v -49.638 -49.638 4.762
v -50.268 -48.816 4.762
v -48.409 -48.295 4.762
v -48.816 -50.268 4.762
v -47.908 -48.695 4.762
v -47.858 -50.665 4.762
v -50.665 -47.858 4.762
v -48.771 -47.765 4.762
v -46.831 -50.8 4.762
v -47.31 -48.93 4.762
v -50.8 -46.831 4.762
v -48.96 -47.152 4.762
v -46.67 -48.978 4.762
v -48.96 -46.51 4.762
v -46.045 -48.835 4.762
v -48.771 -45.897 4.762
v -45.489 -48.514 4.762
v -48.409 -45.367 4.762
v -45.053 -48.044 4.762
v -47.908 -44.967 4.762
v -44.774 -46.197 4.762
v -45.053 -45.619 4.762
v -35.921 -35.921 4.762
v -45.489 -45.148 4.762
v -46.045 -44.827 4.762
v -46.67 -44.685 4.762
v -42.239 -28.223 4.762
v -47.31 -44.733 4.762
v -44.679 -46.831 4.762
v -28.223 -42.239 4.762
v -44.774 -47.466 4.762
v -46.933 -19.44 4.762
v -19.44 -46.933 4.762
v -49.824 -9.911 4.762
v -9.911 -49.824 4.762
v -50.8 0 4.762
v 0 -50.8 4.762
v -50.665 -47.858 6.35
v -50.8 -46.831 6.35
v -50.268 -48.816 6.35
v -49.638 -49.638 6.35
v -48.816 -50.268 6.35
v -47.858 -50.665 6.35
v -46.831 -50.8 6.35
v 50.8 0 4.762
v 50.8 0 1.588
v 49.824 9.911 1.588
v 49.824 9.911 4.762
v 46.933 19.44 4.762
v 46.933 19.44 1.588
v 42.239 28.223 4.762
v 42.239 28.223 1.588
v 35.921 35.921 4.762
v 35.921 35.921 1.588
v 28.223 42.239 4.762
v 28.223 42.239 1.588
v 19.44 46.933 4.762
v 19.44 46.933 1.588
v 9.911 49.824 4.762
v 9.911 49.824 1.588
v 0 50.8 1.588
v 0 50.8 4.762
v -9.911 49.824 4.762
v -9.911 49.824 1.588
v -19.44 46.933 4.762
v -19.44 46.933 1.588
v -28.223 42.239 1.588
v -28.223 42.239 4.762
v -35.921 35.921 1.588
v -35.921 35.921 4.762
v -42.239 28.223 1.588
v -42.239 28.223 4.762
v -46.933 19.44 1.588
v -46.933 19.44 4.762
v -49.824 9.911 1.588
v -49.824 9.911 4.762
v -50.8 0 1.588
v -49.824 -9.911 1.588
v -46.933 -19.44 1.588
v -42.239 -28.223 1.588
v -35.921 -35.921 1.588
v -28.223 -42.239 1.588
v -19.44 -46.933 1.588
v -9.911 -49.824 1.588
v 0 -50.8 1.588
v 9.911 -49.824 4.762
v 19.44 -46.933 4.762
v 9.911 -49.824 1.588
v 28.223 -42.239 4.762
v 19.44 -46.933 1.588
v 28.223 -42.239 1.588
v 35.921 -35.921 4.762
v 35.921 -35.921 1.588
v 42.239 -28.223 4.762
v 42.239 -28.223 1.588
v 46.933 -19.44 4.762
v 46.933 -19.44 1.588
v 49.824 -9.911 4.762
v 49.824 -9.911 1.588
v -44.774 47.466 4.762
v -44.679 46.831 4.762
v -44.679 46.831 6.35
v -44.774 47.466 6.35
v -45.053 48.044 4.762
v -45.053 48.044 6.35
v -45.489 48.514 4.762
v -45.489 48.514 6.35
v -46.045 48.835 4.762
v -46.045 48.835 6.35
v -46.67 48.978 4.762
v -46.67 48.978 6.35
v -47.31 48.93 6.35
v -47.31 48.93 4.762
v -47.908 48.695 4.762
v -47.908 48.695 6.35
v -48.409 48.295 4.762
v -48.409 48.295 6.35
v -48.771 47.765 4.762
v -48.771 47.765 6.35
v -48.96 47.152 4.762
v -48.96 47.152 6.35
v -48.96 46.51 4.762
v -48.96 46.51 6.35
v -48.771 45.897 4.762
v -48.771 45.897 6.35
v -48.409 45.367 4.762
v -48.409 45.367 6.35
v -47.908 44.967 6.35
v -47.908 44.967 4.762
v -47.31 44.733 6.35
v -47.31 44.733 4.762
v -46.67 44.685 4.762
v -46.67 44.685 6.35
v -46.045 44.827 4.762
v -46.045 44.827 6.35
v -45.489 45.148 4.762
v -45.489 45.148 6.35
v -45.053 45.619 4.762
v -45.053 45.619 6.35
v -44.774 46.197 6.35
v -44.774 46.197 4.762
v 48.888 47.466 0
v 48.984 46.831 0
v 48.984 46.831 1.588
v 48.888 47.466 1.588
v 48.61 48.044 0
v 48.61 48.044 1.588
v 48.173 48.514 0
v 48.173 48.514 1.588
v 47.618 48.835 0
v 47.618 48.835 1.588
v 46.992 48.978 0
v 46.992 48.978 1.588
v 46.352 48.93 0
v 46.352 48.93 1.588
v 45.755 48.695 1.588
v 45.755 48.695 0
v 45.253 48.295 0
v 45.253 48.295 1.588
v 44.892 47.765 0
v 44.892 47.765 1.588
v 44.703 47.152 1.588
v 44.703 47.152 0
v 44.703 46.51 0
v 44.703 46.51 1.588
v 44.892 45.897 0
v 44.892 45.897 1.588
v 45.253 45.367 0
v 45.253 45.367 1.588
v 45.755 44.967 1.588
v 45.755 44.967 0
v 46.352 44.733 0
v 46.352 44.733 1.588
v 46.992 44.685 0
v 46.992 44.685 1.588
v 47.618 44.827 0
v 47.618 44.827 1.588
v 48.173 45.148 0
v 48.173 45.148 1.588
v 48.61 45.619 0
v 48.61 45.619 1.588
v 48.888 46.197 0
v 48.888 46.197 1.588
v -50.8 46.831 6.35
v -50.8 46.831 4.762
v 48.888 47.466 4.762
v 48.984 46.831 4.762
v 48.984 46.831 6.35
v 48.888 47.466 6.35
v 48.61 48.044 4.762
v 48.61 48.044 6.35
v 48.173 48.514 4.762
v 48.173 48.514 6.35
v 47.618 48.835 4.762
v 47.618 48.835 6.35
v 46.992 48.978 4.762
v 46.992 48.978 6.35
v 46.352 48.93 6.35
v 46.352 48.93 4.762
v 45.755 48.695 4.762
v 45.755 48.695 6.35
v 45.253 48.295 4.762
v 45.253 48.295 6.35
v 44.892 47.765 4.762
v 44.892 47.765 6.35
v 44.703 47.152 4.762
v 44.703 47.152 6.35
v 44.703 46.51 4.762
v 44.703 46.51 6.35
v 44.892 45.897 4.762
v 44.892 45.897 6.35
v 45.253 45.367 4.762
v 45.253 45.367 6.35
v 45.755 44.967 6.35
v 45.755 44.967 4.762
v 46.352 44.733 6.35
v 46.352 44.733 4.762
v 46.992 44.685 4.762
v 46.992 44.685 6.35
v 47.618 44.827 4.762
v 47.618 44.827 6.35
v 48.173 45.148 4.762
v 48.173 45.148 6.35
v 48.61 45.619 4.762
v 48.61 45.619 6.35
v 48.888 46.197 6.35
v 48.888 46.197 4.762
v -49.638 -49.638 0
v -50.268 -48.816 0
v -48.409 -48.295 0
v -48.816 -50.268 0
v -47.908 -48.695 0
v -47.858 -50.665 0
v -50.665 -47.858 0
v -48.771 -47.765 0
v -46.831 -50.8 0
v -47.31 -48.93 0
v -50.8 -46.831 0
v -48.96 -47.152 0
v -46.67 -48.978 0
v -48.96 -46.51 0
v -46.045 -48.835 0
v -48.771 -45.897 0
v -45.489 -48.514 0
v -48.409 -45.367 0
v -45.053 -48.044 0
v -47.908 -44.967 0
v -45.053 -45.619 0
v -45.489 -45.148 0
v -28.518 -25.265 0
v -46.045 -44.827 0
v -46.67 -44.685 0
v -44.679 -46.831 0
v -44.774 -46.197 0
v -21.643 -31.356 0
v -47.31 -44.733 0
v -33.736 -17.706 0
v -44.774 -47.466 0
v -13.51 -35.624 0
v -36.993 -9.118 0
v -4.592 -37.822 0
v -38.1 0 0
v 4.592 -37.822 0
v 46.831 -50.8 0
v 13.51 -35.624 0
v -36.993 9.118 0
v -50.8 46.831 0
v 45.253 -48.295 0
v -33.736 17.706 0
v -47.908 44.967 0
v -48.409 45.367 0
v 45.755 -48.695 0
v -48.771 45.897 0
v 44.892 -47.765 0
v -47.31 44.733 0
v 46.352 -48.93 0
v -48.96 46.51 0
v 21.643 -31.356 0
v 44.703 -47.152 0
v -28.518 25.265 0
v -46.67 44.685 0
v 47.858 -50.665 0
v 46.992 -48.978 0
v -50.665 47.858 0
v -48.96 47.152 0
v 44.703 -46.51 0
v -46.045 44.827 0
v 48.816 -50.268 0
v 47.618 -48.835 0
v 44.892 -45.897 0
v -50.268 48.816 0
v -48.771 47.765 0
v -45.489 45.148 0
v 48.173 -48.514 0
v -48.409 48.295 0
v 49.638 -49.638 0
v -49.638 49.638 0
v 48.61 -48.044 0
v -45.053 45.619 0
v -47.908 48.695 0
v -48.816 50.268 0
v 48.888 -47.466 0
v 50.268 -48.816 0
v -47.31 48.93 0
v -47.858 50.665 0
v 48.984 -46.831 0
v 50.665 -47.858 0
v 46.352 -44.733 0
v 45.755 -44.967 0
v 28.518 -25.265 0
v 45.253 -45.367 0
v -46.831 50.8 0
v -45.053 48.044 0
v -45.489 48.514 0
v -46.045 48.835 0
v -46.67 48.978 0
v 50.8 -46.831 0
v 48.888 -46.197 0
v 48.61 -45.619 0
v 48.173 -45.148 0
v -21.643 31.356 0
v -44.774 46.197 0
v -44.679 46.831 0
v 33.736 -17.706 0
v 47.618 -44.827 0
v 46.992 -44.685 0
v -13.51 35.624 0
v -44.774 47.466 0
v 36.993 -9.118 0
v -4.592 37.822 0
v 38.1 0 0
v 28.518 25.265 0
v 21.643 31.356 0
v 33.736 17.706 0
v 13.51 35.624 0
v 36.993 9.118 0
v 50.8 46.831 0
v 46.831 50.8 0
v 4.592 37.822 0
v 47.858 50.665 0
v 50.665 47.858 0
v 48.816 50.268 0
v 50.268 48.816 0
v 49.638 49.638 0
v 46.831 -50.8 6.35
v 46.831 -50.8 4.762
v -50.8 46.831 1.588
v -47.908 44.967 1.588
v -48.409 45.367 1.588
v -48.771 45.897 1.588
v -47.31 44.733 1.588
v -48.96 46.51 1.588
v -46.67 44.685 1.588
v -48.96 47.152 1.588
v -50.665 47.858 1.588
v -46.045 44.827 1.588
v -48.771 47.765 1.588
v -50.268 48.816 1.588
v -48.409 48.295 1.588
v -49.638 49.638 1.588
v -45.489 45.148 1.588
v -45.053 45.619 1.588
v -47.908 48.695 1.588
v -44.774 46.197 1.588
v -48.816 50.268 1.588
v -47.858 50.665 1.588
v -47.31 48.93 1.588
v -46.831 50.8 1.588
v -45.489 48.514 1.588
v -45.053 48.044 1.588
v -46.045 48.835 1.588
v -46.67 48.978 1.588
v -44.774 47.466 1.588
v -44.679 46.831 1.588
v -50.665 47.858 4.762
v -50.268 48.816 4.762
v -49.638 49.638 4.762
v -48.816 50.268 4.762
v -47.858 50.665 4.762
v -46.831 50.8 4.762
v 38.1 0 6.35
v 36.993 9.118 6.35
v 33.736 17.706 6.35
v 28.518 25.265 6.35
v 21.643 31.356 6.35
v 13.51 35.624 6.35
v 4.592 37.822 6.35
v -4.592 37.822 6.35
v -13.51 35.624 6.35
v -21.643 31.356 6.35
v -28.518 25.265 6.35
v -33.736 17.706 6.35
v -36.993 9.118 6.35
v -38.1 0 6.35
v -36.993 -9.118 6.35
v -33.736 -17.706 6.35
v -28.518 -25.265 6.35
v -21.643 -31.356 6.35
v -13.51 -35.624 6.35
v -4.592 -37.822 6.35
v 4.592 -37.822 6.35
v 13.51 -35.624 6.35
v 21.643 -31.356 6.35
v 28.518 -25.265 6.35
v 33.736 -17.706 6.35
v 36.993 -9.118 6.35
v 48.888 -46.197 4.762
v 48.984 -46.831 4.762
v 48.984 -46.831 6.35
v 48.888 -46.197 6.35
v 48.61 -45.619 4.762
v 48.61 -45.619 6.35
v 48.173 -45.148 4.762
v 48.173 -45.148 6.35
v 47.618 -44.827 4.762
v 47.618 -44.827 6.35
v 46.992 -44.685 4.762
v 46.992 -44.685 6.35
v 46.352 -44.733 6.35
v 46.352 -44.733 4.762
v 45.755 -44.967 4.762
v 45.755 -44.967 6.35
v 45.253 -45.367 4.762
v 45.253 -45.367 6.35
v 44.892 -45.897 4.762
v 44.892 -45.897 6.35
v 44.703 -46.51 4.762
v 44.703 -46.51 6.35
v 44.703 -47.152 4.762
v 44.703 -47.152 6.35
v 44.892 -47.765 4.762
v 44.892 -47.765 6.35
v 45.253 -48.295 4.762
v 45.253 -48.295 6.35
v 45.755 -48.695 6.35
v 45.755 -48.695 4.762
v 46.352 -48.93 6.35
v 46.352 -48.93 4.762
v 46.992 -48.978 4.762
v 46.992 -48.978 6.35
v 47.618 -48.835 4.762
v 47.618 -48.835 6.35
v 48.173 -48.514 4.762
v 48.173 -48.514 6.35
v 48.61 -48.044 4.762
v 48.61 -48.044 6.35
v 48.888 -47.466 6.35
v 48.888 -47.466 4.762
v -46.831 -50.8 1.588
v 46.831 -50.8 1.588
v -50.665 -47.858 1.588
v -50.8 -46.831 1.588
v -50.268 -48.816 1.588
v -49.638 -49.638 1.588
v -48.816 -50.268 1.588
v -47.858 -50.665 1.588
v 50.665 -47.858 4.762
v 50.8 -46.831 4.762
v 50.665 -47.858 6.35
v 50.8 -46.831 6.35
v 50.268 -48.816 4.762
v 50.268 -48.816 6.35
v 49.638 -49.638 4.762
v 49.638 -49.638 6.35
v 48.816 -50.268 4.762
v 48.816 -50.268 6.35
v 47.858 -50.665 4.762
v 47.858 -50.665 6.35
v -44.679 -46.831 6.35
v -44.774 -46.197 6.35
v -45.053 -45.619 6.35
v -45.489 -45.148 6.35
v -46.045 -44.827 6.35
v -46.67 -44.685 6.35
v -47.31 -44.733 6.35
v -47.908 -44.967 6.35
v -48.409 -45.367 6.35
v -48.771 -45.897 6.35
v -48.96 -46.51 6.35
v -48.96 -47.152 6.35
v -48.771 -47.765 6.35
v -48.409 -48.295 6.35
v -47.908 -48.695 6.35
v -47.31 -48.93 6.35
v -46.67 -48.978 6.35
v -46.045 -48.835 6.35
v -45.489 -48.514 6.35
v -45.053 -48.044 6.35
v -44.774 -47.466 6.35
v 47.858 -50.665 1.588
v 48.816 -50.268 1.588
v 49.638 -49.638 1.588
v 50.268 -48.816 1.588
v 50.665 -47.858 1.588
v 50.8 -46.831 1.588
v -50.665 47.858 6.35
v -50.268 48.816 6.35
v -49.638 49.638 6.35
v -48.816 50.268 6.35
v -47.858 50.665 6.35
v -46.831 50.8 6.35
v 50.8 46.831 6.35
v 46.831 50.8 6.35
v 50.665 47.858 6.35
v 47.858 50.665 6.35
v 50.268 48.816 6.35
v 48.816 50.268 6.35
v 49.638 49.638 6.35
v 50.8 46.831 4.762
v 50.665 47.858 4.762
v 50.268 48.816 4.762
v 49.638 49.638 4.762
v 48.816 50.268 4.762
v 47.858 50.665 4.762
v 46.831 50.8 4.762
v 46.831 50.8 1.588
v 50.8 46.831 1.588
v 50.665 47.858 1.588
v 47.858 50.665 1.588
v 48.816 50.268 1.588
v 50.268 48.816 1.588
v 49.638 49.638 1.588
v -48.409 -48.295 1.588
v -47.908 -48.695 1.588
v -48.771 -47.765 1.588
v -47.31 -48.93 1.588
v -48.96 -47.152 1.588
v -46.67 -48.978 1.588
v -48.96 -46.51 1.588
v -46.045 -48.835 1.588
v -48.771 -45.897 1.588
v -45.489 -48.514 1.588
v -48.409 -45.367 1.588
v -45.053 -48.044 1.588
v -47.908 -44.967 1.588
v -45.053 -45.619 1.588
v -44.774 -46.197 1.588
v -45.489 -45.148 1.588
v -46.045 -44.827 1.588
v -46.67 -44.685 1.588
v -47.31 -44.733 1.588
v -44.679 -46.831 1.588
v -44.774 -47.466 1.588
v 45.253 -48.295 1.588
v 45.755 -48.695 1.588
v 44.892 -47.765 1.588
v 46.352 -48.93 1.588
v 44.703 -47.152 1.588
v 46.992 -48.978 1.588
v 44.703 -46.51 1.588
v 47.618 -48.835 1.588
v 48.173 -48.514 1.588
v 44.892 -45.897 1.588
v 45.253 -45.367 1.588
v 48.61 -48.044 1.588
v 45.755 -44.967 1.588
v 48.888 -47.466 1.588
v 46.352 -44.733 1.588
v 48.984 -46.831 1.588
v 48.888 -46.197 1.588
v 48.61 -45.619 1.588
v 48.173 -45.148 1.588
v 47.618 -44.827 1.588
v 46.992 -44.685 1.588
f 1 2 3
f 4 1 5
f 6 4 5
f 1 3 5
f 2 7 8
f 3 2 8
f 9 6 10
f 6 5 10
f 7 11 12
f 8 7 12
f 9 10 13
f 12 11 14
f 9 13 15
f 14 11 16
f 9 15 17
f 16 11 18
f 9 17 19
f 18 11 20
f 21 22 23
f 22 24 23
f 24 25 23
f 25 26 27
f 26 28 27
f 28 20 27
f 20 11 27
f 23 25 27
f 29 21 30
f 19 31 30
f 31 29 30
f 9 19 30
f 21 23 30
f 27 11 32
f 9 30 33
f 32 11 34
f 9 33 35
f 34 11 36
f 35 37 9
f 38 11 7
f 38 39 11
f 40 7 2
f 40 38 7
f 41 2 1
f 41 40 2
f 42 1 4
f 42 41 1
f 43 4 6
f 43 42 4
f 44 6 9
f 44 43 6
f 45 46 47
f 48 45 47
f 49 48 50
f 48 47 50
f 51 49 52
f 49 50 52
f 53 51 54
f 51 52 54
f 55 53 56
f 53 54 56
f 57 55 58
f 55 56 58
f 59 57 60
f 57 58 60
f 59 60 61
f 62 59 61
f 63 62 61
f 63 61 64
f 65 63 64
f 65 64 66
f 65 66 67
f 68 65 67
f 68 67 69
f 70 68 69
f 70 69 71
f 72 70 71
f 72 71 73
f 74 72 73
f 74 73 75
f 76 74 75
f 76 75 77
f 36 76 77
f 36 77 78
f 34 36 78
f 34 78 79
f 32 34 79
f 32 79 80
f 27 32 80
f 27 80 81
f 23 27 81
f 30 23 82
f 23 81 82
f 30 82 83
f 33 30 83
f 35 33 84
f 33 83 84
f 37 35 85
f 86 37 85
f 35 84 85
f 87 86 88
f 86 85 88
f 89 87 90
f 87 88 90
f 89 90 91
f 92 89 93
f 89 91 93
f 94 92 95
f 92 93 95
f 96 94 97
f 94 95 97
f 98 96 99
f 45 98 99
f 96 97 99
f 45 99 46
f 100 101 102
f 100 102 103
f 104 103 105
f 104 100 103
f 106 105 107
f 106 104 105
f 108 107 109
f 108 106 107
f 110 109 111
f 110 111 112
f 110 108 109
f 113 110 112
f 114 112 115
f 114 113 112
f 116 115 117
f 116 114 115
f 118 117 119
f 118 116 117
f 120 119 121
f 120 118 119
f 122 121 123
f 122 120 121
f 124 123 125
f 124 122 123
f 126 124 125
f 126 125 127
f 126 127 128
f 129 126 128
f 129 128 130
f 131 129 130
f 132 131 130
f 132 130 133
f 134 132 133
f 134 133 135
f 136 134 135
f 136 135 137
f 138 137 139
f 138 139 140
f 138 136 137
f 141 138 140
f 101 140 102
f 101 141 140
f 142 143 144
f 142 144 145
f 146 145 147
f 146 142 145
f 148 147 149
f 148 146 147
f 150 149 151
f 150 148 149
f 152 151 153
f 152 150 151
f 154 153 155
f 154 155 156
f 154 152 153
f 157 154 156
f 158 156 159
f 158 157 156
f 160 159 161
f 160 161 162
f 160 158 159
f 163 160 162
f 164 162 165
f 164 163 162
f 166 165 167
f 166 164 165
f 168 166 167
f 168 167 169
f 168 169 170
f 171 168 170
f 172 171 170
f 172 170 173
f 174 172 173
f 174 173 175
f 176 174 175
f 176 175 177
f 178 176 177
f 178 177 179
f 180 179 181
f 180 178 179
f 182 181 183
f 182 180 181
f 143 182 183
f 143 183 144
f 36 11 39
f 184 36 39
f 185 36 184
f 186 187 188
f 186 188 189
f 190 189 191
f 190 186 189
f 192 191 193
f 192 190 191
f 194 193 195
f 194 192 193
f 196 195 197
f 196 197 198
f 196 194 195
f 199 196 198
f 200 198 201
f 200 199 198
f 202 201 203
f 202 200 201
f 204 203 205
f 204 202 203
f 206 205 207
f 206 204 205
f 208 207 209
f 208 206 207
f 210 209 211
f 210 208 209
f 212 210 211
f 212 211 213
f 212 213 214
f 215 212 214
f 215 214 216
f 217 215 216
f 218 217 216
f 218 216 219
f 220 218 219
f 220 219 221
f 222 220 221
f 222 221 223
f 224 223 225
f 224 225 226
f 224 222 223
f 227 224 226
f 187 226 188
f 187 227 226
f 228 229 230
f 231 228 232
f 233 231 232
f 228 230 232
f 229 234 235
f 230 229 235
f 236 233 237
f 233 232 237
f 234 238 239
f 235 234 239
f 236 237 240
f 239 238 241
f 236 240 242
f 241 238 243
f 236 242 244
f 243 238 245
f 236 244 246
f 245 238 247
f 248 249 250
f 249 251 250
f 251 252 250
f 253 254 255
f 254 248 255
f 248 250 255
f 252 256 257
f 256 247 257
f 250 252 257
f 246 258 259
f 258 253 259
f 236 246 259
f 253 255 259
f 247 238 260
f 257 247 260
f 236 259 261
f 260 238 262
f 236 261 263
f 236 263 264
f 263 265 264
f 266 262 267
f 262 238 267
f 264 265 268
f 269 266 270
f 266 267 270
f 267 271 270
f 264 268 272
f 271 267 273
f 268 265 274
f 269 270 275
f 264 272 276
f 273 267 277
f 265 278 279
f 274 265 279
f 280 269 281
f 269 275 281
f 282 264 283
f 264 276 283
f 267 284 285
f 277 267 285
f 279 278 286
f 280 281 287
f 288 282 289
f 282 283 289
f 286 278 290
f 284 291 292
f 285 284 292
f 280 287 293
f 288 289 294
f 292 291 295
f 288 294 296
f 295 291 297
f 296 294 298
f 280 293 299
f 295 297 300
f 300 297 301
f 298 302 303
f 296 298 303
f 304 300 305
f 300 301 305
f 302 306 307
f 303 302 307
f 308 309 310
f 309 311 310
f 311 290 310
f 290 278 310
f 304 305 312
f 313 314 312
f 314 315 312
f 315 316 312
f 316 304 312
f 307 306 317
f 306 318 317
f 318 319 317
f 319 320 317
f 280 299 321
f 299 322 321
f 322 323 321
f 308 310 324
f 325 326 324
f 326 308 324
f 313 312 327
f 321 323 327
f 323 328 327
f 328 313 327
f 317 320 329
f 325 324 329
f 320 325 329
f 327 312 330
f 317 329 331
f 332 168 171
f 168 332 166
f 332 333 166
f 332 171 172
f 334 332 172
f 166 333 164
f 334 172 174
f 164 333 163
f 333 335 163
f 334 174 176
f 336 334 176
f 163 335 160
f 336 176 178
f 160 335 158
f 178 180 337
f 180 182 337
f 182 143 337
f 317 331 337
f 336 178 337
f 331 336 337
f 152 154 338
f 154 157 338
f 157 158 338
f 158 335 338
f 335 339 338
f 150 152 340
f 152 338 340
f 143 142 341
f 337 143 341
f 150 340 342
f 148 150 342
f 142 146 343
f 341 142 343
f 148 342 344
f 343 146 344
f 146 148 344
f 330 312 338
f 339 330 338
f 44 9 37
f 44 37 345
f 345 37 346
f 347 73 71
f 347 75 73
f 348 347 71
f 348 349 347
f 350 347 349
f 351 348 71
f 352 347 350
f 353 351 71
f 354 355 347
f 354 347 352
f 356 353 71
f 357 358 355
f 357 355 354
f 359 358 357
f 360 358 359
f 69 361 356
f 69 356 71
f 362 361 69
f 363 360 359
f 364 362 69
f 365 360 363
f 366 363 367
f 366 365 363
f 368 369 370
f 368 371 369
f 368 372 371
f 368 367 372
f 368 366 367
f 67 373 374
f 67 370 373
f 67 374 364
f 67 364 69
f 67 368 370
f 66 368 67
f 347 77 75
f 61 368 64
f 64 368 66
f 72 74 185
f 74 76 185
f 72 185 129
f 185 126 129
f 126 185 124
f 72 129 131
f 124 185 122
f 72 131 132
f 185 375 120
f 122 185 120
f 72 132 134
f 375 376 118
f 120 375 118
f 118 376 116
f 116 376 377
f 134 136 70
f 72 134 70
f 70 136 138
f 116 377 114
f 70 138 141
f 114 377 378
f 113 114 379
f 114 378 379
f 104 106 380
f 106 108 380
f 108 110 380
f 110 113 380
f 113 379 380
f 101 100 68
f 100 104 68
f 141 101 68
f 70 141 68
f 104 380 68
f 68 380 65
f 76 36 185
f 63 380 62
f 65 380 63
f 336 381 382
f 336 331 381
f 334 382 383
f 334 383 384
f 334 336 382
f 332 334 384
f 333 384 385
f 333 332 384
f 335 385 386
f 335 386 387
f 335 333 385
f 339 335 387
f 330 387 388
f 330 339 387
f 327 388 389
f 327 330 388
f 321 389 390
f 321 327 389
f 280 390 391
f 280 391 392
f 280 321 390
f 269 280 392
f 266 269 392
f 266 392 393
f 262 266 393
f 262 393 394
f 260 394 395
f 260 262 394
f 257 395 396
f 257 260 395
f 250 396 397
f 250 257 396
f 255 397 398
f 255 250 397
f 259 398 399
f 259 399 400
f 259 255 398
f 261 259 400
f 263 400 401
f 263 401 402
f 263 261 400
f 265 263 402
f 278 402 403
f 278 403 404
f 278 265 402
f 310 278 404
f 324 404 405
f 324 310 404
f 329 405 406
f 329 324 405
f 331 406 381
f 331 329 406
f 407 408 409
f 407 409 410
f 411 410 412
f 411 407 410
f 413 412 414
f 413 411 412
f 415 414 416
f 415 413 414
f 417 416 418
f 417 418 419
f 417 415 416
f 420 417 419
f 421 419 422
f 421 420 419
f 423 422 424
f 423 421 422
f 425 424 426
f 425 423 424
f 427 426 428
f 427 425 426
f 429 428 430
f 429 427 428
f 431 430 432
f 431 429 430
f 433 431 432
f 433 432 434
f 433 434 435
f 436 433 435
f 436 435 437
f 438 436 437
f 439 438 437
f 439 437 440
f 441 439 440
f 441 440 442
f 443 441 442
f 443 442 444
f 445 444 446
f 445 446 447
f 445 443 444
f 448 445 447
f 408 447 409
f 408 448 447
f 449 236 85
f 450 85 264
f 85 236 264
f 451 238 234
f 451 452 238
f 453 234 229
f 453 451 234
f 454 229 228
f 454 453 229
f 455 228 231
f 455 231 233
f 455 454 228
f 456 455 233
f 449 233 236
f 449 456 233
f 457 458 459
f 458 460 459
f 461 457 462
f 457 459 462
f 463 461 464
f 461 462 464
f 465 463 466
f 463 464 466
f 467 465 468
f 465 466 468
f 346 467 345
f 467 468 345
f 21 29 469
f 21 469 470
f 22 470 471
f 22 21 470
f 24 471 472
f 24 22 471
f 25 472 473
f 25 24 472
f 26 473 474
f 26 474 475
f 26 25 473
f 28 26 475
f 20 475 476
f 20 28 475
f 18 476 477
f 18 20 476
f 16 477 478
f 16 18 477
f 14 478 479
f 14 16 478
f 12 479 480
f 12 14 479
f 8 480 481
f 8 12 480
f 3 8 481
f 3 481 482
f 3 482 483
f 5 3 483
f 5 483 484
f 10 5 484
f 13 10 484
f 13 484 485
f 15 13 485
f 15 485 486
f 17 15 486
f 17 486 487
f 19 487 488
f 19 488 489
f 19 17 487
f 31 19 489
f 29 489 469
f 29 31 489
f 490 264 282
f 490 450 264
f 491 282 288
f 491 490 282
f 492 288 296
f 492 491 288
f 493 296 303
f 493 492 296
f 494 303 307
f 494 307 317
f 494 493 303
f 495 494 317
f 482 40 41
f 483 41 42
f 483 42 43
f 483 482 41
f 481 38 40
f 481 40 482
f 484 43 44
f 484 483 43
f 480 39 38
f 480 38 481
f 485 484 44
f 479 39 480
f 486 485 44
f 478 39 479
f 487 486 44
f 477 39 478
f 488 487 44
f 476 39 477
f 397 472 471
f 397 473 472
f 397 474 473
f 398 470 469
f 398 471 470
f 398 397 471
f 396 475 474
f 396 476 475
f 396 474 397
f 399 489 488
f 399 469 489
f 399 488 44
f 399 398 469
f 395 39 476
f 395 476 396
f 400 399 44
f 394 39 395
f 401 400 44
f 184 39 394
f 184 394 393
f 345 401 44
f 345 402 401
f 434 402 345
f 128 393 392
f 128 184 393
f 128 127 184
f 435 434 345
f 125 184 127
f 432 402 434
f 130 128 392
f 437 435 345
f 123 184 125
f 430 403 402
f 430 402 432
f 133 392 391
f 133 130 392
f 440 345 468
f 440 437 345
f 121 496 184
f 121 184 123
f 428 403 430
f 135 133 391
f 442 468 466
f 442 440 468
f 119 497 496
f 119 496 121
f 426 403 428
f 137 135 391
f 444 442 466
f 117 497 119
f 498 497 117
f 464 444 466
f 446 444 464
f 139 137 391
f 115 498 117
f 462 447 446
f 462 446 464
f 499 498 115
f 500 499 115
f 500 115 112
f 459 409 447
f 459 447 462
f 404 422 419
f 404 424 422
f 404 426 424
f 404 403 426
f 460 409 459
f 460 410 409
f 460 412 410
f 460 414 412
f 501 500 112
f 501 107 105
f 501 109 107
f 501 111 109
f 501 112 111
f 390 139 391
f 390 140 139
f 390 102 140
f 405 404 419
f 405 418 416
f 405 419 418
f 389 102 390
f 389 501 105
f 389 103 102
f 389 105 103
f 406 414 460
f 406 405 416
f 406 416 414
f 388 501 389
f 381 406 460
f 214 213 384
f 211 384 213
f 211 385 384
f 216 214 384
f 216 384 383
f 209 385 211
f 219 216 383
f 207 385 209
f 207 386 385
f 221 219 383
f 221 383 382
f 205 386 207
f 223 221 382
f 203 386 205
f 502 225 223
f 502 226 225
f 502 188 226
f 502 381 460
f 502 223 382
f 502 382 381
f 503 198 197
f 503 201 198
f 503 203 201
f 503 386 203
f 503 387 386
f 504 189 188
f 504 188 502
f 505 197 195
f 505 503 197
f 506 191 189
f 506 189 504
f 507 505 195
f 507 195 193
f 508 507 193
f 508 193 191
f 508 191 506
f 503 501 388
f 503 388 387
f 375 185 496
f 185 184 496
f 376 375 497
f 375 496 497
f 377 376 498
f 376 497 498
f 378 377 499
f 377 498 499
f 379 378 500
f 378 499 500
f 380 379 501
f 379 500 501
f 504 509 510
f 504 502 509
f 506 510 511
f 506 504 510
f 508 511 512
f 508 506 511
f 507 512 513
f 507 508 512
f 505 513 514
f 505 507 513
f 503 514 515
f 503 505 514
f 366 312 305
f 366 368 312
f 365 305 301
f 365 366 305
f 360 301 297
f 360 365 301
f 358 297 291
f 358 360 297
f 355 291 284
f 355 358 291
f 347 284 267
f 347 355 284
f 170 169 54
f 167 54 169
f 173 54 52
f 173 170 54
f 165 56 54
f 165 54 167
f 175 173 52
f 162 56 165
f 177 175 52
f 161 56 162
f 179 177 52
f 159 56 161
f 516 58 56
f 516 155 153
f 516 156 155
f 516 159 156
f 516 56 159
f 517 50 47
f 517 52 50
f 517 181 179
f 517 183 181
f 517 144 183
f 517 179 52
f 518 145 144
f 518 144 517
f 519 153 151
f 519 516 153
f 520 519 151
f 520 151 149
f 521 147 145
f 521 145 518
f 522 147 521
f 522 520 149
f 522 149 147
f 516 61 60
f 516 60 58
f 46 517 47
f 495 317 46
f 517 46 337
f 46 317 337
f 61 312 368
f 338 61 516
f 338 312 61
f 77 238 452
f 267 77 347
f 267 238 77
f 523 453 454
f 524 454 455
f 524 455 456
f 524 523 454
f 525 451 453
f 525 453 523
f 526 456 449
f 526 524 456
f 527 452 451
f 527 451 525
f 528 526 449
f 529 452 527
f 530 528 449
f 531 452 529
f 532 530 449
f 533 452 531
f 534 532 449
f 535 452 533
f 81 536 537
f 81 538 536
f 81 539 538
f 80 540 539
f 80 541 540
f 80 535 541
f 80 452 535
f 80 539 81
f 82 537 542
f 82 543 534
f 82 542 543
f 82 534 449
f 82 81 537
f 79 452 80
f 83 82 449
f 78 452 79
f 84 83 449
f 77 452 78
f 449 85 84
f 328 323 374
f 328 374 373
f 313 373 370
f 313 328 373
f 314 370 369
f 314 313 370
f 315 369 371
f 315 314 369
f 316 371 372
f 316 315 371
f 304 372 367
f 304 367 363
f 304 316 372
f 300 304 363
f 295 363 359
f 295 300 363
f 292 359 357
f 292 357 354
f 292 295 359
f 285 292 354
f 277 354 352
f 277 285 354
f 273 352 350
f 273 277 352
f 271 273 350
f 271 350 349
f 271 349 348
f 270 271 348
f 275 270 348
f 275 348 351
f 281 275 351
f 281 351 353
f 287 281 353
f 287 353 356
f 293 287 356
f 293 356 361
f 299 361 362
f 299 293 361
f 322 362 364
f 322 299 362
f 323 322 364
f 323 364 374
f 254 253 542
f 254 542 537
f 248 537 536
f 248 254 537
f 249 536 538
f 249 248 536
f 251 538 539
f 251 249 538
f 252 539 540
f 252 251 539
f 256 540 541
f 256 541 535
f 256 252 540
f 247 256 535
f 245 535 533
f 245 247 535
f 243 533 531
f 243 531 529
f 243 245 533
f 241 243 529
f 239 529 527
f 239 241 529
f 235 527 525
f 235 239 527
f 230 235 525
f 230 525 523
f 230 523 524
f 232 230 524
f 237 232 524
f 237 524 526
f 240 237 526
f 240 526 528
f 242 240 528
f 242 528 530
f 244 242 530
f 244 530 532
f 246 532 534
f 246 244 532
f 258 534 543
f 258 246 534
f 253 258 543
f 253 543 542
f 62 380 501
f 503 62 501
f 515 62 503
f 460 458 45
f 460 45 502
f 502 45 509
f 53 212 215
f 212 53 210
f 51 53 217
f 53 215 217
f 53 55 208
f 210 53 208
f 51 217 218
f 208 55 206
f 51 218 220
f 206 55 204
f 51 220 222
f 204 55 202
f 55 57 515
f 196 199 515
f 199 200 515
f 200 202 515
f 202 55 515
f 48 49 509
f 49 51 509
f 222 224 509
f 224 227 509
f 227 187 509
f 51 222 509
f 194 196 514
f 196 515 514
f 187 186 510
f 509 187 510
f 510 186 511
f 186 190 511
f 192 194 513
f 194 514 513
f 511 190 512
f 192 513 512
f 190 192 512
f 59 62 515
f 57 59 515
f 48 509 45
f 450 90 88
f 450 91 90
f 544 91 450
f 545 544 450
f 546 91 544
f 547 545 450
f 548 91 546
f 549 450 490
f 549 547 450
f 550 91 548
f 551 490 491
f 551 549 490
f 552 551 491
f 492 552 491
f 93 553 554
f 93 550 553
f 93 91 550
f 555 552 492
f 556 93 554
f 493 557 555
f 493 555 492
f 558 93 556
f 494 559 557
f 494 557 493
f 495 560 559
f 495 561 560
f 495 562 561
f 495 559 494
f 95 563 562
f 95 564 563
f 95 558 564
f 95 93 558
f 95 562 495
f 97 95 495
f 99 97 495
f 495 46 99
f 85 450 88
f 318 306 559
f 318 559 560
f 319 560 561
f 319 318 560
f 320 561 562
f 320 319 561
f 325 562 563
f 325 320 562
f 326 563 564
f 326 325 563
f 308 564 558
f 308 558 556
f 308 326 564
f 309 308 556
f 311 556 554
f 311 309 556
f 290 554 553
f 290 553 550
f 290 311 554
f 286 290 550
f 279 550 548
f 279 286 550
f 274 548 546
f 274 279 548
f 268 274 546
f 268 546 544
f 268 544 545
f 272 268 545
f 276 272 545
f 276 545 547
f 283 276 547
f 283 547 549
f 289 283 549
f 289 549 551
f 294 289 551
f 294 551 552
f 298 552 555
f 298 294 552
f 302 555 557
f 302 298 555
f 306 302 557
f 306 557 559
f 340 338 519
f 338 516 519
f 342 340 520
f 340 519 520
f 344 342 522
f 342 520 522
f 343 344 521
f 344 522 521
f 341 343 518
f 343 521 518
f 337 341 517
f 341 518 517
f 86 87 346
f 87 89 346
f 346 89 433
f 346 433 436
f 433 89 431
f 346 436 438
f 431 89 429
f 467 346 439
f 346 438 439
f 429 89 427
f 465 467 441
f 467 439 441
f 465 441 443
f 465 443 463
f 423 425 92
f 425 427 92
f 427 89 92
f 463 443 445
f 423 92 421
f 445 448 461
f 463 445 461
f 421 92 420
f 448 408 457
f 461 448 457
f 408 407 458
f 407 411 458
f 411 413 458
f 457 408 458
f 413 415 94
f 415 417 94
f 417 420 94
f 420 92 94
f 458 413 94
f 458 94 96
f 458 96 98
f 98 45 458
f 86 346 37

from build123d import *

# Parameters (mm, degrees)
F0_W     = 101.6
F0_H     = 101.6
F0_R     = 2.15265
F0_R_2   = 38.1
F1_DEPTH = 1.5875
F2_R     = 50.8
F2_R_2   = 38.1
F3_DEPTH = 3.175
F4_W     = 101.6
F4_H     = 101.6
F4_R     = 2.15265
F4_R_2   = 38.1
F5_DEPTH = 1.5875
F6_R     = 3.96875


with BuildPart() as f1:
    # F0 (on Top) → F1 (new body)
    with BuildSketch(Plane.XY):
        Rectangle(F0_W, F0_H)
        with Locations((-46.83125, -46.83125)):
            Circle(F0_R, mode=Mode.SUBTRACT)
        Circle(F0_R_2, mode=Mode.SUBTRACT)
        with Locations((46.83125, -46.83125)):
            Circle(F0_R, mode=Mode.SUBTRACT)
        with Locations((-46.83125, 46.83125)):
            Circle(F0_R, mode=Mode.SUBTRACT)
        with Locations((46.83125, 46.83125)):
            Circle(F0_R, mode=Mode.SUBTRACT)
    extrude(amount=F1_DEPTH)

    # F2 (on face) → F3 (join)
    with BuildSketch(Plane.XY.offset(1.5875)):
        Circle(F2_R)
        Circle(F2_R_2, mode=Mode.SUBTRACT)
    extrude(amount=F3_DEPTH)

    # F4 (on face) → F5 (join)
    with BuildSketch(Plane.XY.offset(4.7625)):
        Rectangle(F4_W, F4_H)
        with Locations((-46.83125, -46.83125)):
            Circle(F4_R, mode=Mode.SUBTRACT)
        Circle(F4_R_2, mode=Mode.SUBTRACT)
        with Locations((46.83125, -46.83125)):
            Circle(F4_R, mode=Mode.SUBTRACT)
        with Locations((-46.83125, 46.83125)):
            Circle(F4_R, mode=Mode.SUBTRACT)
        with Locations((46.83125, 46.83125)):
            Circle(F4_R, mode=Mode.SUBTRACT)
    extrude(amount=F5_DEPTH)

    # F6
    f6_edges = [f1.edges().sort_by_distance(p)[0] for p in [
        (-50.8, 50.8, 0.79375),
        (-50.8, -50.8, 0.79375),
        (50.8, -50.8, 0.79375),
        (50.8, 50.8, 0.79375),
        (-50.8, 50.8, 5.55625),
        (-50.8, -50.8, 5.55625),
        (50.8, -50.8, 5.55625),
        (50.8, 50.8, 5.55625),
    ]]
    fillet(f6_edges, radius=F6_R)


solid = f1.part
